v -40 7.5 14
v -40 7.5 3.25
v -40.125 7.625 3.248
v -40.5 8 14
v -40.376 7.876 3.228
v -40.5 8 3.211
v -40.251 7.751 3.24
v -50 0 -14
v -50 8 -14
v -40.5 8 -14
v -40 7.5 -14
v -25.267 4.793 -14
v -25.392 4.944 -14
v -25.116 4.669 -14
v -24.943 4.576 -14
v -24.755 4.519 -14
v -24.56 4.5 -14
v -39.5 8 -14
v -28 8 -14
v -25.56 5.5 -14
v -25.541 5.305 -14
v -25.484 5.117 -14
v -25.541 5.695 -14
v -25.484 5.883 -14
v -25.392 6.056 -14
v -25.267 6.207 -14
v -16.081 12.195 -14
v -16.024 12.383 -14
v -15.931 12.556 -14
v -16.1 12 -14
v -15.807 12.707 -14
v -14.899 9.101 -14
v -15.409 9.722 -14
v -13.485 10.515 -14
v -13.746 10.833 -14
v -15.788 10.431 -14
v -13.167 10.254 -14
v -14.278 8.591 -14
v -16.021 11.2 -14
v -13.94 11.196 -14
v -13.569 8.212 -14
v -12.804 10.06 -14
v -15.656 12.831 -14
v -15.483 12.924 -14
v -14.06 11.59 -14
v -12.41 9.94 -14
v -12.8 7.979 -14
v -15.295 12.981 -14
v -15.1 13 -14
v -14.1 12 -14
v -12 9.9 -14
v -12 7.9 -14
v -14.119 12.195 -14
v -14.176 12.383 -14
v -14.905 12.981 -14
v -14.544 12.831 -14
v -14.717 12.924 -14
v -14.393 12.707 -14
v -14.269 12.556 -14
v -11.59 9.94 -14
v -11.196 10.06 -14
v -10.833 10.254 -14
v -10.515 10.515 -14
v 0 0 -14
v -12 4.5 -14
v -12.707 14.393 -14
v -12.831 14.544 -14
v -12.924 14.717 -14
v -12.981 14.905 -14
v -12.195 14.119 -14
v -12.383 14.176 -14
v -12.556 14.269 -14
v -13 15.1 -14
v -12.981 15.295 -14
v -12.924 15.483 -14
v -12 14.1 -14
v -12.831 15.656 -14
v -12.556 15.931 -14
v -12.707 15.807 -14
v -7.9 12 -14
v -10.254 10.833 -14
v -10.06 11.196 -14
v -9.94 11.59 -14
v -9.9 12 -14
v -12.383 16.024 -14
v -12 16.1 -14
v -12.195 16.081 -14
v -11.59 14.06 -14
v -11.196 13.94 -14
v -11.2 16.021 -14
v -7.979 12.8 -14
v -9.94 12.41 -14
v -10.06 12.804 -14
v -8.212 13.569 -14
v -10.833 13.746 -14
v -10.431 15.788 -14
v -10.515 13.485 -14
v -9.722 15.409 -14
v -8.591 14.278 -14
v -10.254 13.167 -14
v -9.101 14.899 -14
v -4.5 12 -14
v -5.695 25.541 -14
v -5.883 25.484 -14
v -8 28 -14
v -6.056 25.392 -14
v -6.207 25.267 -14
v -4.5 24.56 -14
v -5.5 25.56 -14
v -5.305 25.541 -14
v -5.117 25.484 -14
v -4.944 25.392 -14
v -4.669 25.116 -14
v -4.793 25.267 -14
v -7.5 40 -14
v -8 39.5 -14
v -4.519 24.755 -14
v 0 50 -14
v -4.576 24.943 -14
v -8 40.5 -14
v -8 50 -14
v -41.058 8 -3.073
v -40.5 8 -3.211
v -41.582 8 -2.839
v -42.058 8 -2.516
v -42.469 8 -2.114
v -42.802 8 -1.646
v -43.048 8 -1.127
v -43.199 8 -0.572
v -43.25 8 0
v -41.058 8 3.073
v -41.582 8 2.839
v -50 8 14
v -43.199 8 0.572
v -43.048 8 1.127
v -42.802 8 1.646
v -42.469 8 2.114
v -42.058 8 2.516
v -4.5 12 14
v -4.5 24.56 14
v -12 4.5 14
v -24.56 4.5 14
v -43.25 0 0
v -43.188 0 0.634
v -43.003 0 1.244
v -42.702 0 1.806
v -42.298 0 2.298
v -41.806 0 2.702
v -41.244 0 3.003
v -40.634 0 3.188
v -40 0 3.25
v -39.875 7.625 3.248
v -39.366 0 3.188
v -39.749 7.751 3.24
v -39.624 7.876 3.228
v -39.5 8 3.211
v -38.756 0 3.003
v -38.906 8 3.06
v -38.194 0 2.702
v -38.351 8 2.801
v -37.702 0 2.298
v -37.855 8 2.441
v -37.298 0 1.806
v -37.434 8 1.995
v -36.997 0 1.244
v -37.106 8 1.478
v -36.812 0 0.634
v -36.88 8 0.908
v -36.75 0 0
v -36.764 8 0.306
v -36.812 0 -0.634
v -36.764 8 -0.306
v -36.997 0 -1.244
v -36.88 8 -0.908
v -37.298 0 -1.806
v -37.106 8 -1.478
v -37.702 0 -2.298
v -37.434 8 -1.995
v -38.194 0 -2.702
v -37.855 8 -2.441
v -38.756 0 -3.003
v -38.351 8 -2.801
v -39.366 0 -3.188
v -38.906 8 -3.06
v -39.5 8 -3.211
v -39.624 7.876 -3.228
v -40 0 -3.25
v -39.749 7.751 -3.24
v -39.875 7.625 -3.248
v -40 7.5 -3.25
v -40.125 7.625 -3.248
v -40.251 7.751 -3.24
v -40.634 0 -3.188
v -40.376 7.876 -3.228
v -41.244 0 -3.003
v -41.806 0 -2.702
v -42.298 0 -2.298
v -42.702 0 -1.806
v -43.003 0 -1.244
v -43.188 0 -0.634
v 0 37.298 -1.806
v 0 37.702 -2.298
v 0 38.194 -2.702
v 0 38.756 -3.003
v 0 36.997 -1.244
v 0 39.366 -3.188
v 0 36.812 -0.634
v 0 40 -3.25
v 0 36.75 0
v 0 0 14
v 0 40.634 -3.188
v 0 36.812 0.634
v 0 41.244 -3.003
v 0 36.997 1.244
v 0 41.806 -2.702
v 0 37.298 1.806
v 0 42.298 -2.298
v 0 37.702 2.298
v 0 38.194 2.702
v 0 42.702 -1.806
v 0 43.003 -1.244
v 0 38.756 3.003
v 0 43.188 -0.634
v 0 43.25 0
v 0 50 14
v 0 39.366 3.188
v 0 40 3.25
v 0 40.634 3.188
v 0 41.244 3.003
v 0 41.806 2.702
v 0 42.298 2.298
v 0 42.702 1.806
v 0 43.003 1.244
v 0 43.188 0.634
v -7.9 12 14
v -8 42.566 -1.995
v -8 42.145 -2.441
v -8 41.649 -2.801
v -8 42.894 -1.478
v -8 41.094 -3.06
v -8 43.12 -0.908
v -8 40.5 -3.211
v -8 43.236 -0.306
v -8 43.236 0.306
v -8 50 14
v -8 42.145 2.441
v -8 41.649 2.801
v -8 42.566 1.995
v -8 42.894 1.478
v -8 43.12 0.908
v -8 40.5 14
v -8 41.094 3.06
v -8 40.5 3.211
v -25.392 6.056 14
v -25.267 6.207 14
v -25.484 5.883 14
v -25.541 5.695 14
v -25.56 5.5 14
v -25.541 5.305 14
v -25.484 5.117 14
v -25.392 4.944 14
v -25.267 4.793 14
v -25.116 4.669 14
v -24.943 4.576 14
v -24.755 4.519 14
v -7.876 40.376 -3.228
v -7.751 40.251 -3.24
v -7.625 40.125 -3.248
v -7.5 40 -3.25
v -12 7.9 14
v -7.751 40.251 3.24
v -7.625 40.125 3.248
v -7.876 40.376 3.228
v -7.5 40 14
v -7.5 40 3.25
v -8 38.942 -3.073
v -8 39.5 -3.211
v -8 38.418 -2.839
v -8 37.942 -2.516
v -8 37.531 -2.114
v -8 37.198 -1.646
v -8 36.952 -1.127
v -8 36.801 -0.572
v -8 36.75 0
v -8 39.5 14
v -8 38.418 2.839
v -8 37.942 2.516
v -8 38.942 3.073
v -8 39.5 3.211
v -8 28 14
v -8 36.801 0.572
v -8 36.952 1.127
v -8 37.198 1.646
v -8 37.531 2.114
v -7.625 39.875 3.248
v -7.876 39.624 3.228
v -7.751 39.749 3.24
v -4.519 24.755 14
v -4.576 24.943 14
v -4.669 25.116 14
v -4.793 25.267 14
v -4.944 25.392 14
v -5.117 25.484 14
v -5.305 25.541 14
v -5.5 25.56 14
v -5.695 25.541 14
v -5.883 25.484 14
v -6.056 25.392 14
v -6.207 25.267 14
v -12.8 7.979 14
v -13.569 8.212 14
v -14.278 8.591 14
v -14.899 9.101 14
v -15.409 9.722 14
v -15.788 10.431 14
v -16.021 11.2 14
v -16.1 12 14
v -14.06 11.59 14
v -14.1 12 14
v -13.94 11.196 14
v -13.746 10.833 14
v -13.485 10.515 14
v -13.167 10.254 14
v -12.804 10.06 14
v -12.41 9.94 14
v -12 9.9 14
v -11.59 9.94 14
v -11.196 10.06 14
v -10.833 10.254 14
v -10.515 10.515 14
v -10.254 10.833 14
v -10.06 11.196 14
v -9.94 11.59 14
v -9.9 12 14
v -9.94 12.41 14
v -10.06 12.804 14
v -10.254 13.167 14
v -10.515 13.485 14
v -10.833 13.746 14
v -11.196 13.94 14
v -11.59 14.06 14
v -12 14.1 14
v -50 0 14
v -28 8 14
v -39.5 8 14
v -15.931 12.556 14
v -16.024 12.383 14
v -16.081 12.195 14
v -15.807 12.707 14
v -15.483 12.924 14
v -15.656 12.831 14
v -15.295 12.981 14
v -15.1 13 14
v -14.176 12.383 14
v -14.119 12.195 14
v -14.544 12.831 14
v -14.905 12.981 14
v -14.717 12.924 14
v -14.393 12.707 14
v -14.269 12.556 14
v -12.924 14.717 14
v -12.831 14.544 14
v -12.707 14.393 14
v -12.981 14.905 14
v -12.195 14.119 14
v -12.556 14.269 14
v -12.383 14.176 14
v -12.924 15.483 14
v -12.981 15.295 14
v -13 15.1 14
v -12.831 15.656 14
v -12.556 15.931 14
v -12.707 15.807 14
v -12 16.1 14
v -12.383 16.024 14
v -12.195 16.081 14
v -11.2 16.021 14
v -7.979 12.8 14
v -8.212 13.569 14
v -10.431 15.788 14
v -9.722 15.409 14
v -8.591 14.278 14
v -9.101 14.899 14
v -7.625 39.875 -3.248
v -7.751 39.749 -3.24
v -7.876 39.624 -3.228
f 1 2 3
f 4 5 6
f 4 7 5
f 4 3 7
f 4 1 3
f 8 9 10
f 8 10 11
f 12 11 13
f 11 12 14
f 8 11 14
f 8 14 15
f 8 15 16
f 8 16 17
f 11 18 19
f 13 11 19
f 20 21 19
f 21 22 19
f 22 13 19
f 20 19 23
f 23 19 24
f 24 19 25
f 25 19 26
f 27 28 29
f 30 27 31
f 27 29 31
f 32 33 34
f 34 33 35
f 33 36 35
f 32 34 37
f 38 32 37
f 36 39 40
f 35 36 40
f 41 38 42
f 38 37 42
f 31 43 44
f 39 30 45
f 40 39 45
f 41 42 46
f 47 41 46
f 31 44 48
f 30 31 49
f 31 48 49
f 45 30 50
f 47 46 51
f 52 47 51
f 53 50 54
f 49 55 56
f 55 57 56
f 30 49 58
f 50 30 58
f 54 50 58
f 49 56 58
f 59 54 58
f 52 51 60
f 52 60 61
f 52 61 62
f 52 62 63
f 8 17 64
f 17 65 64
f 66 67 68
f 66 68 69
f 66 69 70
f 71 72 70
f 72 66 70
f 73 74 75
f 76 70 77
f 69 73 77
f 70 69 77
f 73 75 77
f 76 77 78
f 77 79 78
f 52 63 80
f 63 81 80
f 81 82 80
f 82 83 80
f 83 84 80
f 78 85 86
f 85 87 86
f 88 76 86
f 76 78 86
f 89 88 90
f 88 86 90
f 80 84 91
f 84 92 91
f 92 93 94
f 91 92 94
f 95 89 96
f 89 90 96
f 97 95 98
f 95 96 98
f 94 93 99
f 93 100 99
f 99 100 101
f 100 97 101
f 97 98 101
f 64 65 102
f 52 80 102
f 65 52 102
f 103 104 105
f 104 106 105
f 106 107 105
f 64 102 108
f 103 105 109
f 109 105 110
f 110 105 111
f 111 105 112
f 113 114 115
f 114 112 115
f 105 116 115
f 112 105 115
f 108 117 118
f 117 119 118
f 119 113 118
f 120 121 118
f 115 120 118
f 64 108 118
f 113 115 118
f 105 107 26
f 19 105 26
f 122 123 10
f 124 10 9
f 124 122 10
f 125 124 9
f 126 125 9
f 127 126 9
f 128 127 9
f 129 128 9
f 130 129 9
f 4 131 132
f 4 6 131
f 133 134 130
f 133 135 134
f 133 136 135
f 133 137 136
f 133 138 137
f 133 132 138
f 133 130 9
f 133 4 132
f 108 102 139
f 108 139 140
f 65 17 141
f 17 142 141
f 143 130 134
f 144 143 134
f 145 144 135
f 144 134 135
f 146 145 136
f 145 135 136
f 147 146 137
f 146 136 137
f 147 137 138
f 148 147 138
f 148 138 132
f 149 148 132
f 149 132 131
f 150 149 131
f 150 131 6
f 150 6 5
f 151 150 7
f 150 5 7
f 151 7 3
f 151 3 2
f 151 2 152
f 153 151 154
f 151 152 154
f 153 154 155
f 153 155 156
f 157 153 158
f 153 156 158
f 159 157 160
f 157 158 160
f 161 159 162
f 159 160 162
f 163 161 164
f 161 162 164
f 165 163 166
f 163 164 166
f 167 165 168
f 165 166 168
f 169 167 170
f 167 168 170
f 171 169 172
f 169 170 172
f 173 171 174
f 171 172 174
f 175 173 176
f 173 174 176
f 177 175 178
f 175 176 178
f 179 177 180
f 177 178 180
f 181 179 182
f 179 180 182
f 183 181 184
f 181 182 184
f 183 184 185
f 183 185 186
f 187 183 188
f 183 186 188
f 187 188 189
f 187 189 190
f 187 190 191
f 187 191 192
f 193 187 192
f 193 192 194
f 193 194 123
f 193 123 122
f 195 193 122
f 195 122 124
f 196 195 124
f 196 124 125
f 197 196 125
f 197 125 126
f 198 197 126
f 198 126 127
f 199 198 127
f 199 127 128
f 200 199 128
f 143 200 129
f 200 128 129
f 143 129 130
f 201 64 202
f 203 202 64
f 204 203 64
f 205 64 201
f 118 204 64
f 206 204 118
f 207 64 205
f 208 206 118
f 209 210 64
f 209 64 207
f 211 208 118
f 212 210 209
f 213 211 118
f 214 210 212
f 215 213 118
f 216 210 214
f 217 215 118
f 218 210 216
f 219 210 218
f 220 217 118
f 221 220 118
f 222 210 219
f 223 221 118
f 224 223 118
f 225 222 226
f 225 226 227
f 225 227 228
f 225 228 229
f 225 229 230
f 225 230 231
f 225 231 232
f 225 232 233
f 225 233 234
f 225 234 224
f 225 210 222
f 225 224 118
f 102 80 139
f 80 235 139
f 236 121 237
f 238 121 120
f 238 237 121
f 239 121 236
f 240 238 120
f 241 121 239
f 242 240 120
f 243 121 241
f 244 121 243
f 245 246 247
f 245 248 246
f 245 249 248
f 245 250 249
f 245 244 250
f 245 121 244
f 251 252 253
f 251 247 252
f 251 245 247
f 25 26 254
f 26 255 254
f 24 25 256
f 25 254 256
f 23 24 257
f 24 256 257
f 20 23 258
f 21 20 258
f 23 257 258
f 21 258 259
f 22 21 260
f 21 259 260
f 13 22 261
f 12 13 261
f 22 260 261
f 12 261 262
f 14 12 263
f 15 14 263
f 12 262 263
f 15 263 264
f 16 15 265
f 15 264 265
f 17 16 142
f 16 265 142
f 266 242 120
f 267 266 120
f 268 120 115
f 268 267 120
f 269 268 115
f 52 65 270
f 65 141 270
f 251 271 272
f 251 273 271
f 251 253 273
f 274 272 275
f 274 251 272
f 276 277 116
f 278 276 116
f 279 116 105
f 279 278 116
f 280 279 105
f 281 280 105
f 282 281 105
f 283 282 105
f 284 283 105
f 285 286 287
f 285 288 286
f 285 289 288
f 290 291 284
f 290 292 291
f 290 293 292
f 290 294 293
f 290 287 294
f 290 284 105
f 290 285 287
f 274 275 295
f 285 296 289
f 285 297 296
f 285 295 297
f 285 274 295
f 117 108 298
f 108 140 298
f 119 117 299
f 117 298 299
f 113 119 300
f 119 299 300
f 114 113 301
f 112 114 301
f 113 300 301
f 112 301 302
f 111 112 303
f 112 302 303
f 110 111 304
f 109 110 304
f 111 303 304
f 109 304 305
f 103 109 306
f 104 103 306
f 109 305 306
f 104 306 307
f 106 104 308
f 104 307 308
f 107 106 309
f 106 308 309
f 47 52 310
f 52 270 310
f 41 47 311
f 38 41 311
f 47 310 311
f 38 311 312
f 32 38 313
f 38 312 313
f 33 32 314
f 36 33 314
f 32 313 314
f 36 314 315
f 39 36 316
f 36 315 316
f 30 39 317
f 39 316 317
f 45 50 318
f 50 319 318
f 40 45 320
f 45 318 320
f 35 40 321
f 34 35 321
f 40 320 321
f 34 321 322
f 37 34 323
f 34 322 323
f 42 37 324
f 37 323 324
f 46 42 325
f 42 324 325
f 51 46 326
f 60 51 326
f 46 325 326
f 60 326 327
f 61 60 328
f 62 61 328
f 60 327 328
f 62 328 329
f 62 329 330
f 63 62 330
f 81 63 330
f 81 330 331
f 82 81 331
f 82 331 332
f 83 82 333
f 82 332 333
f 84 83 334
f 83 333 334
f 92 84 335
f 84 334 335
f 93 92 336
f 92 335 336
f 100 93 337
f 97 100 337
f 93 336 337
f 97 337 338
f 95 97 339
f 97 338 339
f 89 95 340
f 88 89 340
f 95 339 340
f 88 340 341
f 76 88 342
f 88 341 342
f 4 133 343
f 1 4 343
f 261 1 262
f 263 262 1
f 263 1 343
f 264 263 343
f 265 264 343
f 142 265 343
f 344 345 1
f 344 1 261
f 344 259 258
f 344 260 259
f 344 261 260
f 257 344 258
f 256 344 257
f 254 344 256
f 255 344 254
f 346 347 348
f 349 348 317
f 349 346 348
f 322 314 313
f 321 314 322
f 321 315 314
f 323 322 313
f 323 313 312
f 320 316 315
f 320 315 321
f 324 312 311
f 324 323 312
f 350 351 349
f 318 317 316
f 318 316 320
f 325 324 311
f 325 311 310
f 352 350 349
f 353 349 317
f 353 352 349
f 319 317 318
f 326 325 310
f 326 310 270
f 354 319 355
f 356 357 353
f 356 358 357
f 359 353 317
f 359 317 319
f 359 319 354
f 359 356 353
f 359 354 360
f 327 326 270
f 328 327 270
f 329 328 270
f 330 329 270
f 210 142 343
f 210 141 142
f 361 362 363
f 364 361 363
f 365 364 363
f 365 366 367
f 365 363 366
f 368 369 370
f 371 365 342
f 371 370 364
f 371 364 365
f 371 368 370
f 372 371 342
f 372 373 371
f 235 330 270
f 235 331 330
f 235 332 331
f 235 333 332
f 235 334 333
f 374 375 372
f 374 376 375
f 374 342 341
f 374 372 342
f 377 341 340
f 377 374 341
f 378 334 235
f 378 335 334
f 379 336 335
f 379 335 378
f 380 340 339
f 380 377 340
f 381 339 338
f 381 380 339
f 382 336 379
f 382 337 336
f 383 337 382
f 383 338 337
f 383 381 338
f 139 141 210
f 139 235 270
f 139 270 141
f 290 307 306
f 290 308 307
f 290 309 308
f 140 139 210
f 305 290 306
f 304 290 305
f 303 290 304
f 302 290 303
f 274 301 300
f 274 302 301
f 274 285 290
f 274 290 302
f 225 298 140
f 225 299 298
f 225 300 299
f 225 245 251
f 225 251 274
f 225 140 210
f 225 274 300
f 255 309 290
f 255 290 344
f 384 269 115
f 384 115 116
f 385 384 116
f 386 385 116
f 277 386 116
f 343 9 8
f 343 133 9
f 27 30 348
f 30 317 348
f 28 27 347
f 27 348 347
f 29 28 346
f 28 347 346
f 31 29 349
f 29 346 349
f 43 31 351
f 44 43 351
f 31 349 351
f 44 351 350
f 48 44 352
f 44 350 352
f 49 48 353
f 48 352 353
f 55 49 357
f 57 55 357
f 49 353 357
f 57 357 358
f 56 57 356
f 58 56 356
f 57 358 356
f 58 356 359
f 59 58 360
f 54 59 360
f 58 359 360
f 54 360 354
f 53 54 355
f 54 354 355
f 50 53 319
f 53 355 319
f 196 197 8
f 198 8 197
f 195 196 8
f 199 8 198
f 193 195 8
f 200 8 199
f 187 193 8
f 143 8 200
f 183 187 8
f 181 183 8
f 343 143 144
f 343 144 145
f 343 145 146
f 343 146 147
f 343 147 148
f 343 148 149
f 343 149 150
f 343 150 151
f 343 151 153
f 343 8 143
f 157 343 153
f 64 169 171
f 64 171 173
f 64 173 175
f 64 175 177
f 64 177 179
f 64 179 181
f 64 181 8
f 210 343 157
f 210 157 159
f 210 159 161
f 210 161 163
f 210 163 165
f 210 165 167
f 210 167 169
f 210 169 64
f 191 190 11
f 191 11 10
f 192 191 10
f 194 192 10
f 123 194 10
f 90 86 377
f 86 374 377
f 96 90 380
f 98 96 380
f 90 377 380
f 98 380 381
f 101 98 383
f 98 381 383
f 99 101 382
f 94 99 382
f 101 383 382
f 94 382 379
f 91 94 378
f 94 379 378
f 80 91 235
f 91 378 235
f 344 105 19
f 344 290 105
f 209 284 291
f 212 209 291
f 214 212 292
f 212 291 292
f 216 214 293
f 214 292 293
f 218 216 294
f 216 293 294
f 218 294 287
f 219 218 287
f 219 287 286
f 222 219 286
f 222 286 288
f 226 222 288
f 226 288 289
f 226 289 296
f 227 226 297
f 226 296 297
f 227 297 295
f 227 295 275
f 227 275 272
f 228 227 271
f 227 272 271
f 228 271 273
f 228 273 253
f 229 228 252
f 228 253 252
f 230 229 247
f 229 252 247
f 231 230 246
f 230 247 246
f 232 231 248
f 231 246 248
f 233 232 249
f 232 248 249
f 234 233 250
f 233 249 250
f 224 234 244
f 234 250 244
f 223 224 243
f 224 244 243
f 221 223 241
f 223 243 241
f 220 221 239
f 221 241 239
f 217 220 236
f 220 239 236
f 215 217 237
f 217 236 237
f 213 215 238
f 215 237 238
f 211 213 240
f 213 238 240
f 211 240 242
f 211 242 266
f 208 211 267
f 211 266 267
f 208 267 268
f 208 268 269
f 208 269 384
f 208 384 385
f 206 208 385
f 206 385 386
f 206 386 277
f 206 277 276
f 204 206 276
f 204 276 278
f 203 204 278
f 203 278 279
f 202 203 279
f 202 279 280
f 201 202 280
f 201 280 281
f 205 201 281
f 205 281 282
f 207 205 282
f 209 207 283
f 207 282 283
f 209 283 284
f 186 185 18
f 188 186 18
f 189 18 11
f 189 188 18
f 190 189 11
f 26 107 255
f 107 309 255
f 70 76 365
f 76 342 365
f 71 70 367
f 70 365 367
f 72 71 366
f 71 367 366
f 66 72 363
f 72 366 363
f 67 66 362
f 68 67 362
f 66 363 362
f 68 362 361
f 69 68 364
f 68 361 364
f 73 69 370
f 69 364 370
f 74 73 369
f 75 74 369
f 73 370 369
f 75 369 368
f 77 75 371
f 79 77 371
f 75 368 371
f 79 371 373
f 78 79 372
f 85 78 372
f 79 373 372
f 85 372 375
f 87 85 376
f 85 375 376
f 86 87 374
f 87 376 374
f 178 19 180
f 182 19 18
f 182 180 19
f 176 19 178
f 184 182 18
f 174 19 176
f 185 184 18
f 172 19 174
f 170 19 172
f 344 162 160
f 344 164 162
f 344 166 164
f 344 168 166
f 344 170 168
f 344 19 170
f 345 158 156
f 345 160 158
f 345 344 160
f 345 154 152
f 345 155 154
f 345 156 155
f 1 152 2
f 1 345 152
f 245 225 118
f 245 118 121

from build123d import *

# Parameters (mm, degrees)
EXTRUDE_1_DEPTH     = 14
SKETCH_2_R          = 3.25
CUT_EXTRUDE_1_DEPTH = 9
SKETCH_3_R          = 3.25
CUT_EXTRUDE_2_DEPTH = 9


with BuildPart() as part:
    # Эскиз1 → Бобышка-Вытянуть1 (new body, symmetric)
    with BuildSketch(Plane.XY):
        Polygon((-50, 0), (0, 0), (0, 50), (-8, 50), (-8, 40.5), (-7.5, 40), (-8, 39.5), (-8, 28), (-28, 8), (-39.5, 8), (-40, 7.5), (-40.5, 8), (-50, 8), align=None)
        with BuildLine():
            Line((-4.5, 12), (-4.5, 24.560303038))
            ThreePointArc((-4.5, 24.560303038), (-5.117316568, 25.484182571), (-6.207106781, 25.267409819))
            Line((-6.207106781, 25.267409819), (-25.267409819, 6.207106781))
            ThreePointArc((-25.267409819, 6.207106781), (-25.484182571, 5.117316568), (-24.560303038, 4.5))
            Line((-24.560303038, 4.5), (-12, 4.5))
            Line((-12, 4.5), (-12, 7.9))
            ThreePointArc((-12, 7.9), (-14.899137803, 9.100862197), (-16.1, 12))
            ThreePointArc((-16.1, 12), (-15.1, 13), (-14.1, 12))
            ThreePointArc((-14.1, 12), (-10.51507576, 10.51507576), (-12, 14.1))
            ThreePointArc((-12, 14.1), (-13, 15.1), (-12, 16.1))
            ThreePointArc((-12, 16.1), (-9.100862197, 14.899137803), (-7.9, 12))
            Line((-7.9, 12), (-4.5, 12))
        make_face(mode=Mode.SUBTRACT)
    extrude(amount=EXTRUDE_1_DEPTH, both=True)

    # Эскиз2 → Вырез-Вытянуть1 (cut, through all)
    with BuildSketch(Plane.ZY.offset(8)):
        with Locations(Location((0, 40, 0), (0, 0, 270))):  # turned: the seam where the file's is
            Circle(SKETCH_2_R)
    extrude(amount=-CUT_EXTRUDE_1_DEPTH, mode=Mode.SUBTRACT)

    # Эскиз3 → Вырез-Вытянуть2 (cut, through all)
    with BuildSketch(Plane(origin=(0, 8, 0), x_dir=(1, 0, 0), z_dir=(0, 1, 0))):
        with Locations(Location((-40, 0, 0), (0, 0, 180))):  # turned: the seam where the file's is
            Circle(SKETCH_3_R)
    extrude(amount=-CUT_EXTRUDE_2_DEPTH, mode=Mode.SUBTRACT)


solid = part.part
